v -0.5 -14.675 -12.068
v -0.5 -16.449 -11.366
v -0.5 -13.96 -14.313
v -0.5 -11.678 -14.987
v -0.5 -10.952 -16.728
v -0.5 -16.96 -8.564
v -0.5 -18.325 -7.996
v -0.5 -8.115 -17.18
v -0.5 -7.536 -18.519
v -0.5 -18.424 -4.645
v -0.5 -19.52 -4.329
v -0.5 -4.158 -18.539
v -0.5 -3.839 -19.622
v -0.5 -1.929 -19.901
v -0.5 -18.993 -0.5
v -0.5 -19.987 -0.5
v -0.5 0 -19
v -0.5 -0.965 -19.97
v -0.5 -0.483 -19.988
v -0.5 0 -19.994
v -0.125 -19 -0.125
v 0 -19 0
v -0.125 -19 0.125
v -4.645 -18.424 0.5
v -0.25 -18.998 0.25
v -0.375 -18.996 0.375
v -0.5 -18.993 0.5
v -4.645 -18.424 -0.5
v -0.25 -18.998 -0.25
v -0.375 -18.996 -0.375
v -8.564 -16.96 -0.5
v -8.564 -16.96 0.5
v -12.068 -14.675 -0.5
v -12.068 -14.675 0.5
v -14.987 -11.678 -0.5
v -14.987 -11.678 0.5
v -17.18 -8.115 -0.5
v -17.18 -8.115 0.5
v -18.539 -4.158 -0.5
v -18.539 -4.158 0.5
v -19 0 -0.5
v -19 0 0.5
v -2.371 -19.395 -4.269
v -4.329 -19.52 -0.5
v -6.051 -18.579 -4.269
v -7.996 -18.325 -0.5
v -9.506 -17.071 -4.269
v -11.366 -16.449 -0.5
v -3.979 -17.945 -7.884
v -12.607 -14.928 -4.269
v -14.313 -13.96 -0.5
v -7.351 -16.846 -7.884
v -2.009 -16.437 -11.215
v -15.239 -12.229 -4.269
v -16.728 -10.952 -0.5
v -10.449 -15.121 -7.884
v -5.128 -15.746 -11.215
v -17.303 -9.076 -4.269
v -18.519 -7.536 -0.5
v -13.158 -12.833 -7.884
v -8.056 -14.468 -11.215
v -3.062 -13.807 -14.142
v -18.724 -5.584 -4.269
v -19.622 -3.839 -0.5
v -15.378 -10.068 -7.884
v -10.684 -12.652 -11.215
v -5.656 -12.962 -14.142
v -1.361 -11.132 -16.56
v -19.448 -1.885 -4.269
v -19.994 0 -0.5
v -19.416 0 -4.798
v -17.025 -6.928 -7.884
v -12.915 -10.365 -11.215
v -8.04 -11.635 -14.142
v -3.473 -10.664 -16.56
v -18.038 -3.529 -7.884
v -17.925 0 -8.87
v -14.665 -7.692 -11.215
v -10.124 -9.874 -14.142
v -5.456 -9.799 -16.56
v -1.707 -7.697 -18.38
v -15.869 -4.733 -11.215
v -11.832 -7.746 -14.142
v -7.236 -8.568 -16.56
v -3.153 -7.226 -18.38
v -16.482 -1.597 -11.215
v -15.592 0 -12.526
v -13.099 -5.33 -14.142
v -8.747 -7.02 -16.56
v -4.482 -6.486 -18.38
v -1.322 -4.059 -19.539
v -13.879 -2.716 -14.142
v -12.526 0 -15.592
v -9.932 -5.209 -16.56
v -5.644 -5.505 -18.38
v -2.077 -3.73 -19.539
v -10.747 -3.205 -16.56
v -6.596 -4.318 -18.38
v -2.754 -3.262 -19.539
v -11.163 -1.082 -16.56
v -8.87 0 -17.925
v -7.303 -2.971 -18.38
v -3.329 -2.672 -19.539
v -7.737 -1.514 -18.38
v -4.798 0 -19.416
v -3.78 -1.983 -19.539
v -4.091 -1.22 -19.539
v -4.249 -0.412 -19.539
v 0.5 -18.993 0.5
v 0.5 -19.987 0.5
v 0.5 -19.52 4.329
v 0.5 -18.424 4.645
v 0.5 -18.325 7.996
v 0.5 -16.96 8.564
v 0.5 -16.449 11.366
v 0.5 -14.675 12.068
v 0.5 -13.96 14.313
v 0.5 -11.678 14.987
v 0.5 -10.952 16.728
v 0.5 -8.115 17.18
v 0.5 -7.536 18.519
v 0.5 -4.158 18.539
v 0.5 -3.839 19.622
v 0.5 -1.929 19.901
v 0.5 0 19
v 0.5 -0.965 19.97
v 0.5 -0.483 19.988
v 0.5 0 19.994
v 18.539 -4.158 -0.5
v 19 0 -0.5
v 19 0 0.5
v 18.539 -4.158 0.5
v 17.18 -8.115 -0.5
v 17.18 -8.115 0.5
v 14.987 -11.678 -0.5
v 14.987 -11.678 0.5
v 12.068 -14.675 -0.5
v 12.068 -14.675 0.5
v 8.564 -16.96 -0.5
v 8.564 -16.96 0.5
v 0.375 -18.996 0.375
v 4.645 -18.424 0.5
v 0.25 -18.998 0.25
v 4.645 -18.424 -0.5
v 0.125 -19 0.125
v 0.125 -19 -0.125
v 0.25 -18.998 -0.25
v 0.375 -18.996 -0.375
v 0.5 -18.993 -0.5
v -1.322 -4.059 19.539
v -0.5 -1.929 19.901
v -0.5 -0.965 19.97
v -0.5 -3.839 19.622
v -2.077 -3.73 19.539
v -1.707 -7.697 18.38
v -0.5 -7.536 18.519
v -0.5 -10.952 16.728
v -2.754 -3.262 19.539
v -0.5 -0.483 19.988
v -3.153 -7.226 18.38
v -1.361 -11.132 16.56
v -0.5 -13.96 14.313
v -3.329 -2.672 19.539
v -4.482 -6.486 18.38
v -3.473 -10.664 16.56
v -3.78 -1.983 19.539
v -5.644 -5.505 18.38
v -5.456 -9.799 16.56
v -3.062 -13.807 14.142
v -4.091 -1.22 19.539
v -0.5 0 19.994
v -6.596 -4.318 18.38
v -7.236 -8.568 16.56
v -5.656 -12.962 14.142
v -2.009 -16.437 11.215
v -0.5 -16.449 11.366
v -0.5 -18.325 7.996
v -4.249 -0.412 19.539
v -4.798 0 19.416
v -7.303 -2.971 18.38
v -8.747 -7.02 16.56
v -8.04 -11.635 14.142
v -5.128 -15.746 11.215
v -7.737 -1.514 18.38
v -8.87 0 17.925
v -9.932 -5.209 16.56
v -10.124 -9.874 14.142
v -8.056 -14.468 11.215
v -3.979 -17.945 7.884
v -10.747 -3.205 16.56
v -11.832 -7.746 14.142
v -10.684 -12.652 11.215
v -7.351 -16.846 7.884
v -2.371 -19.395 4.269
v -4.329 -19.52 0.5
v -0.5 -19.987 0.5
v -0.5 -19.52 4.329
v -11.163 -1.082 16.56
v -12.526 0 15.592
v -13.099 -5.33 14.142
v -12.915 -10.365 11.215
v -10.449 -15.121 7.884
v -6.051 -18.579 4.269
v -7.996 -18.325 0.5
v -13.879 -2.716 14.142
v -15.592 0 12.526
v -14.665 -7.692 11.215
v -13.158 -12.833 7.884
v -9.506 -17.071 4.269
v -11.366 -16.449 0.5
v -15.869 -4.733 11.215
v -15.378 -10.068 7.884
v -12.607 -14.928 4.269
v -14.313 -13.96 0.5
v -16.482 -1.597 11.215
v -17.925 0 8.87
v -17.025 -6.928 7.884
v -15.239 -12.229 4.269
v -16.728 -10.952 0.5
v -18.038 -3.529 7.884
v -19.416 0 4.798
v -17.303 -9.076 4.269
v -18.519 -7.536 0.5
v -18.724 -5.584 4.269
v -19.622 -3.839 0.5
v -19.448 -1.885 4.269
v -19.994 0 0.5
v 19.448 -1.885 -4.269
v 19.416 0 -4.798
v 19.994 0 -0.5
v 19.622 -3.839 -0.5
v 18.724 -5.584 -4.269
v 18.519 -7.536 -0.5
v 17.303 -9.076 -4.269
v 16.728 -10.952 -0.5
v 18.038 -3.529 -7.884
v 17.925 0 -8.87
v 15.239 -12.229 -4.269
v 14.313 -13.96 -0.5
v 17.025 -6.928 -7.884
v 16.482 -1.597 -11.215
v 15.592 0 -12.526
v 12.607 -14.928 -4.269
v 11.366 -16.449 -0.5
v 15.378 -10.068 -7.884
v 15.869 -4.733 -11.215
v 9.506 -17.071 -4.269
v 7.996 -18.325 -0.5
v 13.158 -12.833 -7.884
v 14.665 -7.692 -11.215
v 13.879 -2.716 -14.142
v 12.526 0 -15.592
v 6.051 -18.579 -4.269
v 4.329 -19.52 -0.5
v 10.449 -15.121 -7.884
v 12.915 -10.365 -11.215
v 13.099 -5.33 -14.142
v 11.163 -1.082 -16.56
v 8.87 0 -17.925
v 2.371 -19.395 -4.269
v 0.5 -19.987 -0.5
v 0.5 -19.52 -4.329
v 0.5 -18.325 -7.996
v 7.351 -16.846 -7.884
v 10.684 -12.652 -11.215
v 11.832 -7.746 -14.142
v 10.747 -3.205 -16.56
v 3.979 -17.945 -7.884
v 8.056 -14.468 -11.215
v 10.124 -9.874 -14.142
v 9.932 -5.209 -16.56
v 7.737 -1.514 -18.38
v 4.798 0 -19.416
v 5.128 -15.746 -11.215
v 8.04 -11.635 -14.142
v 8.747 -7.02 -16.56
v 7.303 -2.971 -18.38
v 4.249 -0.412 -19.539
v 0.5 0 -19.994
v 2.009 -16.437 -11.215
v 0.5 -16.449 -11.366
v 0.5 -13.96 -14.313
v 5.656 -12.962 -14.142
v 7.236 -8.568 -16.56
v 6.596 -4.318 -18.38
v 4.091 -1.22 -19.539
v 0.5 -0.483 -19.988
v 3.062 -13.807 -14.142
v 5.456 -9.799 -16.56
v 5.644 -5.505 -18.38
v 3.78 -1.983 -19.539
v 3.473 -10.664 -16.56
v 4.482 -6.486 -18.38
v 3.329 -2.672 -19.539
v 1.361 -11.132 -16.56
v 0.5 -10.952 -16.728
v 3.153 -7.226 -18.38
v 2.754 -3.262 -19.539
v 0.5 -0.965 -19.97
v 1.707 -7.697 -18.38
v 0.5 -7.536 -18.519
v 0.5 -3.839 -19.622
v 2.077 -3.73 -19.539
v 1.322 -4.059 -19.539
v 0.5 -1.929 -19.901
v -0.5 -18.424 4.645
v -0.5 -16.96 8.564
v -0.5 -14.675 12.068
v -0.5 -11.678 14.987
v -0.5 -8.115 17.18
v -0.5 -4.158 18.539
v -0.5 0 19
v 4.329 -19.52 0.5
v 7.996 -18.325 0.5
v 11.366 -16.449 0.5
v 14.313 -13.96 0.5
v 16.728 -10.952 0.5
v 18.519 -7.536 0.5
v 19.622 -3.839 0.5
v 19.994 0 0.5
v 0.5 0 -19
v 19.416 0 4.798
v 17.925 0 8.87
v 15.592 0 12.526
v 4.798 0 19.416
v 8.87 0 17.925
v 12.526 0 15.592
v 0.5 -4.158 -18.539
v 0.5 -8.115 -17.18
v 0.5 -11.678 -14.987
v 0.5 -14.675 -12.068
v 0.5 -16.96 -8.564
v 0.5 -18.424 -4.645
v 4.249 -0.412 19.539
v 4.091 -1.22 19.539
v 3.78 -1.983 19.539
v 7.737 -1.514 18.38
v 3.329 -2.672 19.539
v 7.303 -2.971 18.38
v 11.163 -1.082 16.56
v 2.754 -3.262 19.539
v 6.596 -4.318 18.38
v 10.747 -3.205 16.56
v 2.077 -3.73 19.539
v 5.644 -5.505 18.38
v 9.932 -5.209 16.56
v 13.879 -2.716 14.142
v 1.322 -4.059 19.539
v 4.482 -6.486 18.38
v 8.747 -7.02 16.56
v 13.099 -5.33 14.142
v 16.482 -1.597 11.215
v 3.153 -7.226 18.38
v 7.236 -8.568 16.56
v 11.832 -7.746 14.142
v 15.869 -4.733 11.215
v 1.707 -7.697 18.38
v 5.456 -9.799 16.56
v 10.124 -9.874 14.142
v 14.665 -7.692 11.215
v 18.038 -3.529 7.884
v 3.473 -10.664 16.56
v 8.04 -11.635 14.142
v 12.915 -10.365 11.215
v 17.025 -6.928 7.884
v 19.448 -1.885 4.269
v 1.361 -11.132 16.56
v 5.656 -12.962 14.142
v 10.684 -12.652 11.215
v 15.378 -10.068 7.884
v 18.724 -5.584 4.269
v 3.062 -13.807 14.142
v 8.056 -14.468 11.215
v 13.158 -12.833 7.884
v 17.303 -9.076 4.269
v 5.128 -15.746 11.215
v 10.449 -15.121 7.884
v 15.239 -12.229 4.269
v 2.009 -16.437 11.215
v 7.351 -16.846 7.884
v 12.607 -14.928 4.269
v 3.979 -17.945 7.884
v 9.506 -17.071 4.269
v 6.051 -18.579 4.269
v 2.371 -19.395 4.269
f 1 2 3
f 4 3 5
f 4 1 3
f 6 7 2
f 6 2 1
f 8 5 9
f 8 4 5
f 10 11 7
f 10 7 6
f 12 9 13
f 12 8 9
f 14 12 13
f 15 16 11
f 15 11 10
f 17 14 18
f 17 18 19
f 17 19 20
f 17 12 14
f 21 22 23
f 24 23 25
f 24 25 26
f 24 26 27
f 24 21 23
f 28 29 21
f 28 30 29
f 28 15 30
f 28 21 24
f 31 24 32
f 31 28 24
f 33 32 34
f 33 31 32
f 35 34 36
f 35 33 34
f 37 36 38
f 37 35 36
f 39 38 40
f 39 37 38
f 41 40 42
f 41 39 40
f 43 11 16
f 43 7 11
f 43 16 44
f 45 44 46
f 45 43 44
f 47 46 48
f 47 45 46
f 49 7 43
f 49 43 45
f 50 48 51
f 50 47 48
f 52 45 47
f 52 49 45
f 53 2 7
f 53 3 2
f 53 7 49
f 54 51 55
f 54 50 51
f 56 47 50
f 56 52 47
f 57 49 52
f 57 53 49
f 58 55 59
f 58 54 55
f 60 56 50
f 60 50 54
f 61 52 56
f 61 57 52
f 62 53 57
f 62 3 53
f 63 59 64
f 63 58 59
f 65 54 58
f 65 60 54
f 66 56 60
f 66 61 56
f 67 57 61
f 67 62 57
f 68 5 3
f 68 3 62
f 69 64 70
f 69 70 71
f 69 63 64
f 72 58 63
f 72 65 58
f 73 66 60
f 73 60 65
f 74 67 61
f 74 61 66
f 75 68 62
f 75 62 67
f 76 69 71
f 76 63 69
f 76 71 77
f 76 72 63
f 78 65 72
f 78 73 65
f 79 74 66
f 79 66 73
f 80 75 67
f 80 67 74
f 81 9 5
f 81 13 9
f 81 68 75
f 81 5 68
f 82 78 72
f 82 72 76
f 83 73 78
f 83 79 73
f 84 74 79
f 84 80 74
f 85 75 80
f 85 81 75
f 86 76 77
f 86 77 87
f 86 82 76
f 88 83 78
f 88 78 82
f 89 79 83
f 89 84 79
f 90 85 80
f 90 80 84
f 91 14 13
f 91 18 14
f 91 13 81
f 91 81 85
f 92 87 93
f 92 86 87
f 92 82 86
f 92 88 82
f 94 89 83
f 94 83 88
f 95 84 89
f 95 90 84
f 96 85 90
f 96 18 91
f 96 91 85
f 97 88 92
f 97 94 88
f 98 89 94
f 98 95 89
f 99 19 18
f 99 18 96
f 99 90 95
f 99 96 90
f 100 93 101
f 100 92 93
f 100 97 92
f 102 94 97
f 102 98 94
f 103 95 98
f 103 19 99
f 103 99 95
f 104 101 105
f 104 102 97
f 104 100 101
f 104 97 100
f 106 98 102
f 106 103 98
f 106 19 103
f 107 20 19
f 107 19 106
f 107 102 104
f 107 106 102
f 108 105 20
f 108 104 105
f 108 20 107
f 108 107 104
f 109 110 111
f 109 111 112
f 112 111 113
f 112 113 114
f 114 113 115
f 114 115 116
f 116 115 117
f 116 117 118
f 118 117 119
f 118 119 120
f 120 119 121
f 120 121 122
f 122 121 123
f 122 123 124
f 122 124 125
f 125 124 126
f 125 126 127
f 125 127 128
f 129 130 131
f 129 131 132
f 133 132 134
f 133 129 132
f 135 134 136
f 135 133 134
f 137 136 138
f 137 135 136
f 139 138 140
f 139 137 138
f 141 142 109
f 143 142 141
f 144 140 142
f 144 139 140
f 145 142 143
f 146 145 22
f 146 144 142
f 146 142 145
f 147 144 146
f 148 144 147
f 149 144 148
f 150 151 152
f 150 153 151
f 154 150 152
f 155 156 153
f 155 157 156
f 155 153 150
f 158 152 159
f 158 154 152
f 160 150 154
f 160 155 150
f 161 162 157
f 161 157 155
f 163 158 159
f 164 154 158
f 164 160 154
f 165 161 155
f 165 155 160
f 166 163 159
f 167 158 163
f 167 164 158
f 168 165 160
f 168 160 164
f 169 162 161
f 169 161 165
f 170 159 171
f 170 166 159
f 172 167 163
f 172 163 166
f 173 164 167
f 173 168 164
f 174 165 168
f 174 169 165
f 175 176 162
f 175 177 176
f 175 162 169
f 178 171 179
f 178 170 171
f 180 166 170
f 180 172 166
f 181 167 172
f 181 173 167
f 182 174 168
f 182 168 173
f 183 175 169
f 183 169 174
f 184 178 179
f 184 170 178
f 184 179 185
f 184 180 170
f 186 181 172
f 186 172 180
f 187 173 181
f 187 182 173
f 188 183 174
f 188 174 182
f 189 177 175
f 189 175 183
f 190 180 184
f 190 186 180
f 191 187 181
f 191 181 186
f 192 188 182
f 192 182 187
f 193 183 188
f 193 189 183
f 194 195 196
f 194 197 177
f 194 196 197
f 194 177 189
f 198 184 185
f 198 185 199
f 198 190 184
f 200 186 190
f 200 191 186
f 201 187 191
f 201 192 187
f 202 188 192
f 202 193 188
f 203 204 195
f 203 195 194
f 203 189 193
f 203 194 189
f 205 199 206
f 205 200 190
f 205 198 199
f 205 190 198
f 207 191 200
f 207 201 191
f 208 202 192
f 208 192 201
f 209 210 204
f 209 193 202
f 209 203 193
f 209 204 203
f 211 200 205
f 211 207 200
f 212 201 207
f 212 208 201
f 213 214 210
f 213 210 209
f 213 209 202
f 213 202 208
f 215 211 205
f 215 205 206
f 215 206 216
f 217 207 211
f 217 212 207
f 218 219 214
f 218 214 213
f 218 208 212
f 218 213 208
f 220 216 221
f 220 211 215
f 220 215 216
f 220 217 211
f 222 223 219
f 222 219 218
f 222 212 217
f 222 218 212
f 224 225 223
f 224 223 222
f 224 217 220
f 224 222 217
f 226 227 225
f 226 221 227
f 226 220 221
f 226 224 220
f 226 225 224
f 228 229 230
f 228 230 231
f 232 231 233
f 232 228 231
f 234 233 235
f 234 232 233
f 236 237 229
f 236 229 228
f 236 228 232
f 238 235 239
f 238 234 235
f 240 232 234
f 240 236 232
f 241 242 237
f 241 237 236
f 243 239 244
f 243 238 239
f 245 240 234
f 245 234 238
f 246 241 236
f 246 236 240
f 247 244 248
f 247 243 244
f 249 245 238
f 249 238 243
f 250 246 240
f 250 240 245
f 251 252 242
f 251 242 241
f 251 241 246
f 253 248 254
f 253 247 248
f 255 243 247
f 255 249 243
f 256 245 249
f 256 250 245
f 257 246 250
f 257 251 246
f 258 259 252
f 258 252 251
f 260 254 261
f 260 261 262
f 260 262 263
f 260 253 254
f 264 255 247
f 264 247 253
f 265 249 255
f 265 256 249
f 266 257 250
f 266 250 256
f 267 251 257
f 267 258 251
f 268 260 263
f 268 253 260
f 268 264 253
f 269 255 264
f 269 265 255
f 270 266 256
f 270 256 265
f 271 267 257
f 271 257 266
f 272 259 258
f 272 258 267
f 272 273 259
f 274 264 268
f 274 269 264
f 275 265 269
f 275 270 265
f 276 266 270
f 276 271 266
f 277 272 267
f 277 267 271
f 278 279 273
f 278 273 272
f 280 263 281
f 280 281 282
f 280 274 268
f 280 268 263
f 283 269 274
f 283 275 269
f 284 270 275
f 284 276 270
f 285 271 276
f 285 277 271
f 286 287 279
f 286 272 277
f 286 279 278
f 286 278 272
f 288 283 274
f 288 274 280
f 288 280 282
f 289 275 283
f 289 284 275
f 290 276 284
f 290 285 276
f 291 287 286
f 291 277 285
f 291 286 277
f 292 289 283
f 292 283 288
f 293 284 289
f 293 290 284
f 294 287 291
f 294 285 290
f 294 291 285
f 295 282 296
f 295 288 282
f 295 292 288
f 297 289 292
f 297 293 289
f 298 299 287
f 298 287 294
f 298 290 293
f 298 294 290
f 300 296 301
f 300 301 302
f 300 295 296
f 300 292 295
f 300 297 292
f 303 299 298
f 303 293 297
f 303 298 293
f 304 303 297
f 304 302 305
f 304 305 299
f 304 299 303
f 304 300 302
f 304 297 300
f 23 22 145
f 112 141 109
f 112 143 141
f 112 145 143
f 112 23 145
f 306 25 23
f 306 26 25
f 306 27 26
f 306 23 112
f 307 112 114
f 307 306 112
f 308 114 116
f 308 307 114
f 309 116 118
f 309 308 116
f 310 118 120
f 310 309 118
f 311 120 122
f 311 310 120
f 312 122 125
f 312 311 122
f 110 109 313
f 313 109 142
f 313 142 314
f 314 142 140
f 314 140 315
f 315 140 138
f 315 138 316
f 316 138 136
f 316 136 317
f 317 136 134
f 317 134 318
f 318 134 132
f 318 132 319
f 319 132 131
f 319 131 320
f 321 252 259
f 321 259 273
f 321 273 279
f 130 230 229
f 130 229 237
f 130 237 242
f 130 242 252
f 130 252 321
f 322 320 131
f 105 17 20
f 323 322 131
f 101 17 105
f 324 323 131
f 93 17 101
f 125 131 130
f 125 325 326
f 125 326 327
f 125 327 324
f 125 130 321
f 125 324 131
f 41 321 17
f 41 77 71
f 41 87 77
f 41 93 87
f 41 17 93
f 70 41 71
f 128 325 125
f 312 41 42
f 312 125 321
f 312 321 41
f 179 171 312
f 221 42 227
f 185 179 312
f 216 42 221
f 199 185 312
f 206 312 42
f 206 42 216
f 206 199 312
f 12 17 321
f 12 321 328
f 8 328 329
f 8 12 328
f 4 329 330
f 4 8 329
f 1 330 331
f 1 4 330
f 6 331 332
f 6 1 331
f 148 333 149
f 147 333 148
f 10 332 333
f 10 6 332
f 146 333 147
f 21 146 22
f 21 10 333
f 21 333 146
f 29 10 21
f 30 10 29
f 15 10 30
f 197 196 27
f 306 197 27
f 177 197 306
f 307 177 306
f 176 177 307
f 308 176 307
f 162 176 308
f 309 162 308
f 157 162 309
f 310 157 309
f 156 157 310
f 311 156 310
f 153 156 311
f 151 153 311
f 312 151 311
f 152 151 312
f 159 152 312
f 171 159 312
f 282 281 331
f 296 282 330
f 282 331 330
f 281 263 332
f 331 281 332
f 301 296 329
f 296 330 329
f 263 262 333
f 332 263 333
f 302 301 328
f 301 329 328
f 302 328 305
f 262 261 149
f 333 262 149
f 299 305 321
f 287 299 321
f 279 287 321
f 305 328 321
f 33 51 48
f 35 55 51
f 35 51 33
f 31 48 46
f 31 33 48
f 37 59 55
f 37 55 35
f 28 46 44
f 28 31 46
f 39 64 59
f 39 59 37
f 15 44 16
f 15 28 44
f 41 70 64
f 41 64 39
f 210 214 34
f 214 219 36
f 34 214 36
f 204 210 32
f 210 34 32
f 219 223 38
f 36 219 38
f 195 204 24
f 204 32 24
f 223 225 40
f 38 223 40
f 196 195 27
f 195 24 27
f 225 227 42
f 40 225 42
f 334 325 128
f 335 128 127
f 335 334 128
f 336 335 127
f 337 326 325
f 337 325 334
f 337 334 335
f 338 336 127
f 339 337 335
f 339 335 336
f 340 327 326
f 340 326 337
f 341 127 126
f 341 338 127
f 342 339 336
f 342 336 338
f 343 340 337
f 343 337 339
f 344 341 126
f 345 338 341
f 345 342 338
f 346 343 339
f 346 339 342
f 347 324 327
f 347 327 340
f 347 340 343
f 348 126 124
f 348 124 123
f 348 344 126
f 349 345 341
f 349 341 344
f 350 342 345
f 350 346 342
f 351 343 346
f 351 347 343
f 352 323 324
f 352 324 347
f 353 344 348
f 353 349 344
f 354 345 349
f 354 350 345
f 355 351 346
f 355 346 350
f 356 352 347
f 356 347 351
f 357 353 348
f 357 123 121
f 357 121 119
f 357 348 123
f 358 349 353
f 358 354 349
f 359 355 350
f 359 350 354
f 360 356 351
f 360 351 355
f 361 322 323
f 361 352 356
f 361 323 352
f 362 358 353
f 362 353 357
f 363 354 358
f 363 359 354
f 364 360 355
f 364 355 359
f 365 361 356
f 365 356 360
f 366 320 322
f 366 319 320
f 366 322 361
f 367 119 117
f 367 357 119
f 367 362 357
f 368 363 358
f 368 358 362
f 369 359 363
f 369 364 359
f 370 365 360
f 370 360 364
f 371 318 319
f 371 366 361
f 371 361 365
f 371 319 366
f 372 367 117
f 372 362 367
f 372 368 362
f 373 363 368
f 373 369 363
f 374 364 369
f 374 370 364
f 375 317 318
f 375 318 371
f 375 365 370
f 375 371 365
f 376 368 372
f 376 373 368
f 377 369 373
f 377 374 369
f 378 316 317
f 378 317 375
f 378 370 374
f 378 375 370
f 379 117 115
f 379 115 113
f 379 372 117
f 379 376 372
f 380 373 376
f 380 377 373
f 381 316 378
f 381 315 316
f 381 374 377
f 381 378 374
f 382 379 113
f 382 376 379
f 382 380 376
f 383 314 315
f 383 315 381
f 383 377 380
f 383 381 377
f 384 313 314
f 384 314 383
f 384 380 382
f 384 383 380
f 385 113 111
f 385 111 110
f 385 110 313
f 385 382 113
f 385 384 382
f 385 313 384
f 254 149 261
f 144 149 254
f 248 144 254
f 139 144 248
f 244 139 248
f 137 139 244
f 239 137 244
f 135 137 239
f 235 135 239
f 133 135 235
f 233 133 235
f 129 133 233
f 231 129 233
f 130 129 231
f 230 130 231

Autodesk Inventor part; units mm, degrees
ref_plane "YZ Plane" through (0, 0, 0) normal (1, 0, 0) x (0, 1, 0)
ref_plane "XZ Plane" through (0, 0, 0) normal (0, 1, 0) x (-1, 0, 0)
ref_plane "XY Plane" through (0, 0, 0) normal (0, 0, 1) x (1, 0, 0)
sketch "草圖1" plane through (0, 0, 0) normal (0, 1, 0) x (-1, 0, 0)
  circle A0 centre (0, 0) radius 20
  line L0 (0, 20) -> (0, -20)
  dimension "d0" = 40
revolve "迴轉1" add sketch "草圖1" angle 180 about axis through (0, 0, 20) along (0, 0, -1) picked at (-3.0982, -5.903) contours L0 A0
sketch "草圖2" plane through (0, 0, 0) normal (0, 0, 1) x (1, 0, 0)
  line L0 (20, 0) -> (-20, 0) projected
  arc A0 (-20, 0) -> (20, 0) centre (0, 0) ccw
  arc A1 (-20, 0) -> (20, 0) centre (0, 0) ccw projected
  arc A2 (-19, 0) -> (19, 0) centre (0, 0) ccw
  line L1 (-19, 0) -> (-20, 0)
  line L2 (19, 0) -> (20, 0)
  dimension "d2" = 1
extrude "擠出1" cut sketch "草圖2" along normal mid plane 1 contours A0 L0 A2
sketch "草圖3" plane through (0, 0, 0) normal (1, 0, 0) x (0, 1, 0)
  line L0 (0, 0.5) -> (0, 20) projected
  line L1 (0, -20) -> (0, -0.5) projected
  arc A0 (0, 19) -> (0, -19) centre (0, 0) ccw
  arc A1 (0, 20) -> (0, -20) centre (0, 0) ccw
  line L2 (0, 20) -> (0, 19)
  line L3 (0, -20) -> (0, -19)
  dimension "d5" = 1
extrude "擠出2" cut sketch "草圖3" along normal mid plane 1
properties part number "屋2 base"
